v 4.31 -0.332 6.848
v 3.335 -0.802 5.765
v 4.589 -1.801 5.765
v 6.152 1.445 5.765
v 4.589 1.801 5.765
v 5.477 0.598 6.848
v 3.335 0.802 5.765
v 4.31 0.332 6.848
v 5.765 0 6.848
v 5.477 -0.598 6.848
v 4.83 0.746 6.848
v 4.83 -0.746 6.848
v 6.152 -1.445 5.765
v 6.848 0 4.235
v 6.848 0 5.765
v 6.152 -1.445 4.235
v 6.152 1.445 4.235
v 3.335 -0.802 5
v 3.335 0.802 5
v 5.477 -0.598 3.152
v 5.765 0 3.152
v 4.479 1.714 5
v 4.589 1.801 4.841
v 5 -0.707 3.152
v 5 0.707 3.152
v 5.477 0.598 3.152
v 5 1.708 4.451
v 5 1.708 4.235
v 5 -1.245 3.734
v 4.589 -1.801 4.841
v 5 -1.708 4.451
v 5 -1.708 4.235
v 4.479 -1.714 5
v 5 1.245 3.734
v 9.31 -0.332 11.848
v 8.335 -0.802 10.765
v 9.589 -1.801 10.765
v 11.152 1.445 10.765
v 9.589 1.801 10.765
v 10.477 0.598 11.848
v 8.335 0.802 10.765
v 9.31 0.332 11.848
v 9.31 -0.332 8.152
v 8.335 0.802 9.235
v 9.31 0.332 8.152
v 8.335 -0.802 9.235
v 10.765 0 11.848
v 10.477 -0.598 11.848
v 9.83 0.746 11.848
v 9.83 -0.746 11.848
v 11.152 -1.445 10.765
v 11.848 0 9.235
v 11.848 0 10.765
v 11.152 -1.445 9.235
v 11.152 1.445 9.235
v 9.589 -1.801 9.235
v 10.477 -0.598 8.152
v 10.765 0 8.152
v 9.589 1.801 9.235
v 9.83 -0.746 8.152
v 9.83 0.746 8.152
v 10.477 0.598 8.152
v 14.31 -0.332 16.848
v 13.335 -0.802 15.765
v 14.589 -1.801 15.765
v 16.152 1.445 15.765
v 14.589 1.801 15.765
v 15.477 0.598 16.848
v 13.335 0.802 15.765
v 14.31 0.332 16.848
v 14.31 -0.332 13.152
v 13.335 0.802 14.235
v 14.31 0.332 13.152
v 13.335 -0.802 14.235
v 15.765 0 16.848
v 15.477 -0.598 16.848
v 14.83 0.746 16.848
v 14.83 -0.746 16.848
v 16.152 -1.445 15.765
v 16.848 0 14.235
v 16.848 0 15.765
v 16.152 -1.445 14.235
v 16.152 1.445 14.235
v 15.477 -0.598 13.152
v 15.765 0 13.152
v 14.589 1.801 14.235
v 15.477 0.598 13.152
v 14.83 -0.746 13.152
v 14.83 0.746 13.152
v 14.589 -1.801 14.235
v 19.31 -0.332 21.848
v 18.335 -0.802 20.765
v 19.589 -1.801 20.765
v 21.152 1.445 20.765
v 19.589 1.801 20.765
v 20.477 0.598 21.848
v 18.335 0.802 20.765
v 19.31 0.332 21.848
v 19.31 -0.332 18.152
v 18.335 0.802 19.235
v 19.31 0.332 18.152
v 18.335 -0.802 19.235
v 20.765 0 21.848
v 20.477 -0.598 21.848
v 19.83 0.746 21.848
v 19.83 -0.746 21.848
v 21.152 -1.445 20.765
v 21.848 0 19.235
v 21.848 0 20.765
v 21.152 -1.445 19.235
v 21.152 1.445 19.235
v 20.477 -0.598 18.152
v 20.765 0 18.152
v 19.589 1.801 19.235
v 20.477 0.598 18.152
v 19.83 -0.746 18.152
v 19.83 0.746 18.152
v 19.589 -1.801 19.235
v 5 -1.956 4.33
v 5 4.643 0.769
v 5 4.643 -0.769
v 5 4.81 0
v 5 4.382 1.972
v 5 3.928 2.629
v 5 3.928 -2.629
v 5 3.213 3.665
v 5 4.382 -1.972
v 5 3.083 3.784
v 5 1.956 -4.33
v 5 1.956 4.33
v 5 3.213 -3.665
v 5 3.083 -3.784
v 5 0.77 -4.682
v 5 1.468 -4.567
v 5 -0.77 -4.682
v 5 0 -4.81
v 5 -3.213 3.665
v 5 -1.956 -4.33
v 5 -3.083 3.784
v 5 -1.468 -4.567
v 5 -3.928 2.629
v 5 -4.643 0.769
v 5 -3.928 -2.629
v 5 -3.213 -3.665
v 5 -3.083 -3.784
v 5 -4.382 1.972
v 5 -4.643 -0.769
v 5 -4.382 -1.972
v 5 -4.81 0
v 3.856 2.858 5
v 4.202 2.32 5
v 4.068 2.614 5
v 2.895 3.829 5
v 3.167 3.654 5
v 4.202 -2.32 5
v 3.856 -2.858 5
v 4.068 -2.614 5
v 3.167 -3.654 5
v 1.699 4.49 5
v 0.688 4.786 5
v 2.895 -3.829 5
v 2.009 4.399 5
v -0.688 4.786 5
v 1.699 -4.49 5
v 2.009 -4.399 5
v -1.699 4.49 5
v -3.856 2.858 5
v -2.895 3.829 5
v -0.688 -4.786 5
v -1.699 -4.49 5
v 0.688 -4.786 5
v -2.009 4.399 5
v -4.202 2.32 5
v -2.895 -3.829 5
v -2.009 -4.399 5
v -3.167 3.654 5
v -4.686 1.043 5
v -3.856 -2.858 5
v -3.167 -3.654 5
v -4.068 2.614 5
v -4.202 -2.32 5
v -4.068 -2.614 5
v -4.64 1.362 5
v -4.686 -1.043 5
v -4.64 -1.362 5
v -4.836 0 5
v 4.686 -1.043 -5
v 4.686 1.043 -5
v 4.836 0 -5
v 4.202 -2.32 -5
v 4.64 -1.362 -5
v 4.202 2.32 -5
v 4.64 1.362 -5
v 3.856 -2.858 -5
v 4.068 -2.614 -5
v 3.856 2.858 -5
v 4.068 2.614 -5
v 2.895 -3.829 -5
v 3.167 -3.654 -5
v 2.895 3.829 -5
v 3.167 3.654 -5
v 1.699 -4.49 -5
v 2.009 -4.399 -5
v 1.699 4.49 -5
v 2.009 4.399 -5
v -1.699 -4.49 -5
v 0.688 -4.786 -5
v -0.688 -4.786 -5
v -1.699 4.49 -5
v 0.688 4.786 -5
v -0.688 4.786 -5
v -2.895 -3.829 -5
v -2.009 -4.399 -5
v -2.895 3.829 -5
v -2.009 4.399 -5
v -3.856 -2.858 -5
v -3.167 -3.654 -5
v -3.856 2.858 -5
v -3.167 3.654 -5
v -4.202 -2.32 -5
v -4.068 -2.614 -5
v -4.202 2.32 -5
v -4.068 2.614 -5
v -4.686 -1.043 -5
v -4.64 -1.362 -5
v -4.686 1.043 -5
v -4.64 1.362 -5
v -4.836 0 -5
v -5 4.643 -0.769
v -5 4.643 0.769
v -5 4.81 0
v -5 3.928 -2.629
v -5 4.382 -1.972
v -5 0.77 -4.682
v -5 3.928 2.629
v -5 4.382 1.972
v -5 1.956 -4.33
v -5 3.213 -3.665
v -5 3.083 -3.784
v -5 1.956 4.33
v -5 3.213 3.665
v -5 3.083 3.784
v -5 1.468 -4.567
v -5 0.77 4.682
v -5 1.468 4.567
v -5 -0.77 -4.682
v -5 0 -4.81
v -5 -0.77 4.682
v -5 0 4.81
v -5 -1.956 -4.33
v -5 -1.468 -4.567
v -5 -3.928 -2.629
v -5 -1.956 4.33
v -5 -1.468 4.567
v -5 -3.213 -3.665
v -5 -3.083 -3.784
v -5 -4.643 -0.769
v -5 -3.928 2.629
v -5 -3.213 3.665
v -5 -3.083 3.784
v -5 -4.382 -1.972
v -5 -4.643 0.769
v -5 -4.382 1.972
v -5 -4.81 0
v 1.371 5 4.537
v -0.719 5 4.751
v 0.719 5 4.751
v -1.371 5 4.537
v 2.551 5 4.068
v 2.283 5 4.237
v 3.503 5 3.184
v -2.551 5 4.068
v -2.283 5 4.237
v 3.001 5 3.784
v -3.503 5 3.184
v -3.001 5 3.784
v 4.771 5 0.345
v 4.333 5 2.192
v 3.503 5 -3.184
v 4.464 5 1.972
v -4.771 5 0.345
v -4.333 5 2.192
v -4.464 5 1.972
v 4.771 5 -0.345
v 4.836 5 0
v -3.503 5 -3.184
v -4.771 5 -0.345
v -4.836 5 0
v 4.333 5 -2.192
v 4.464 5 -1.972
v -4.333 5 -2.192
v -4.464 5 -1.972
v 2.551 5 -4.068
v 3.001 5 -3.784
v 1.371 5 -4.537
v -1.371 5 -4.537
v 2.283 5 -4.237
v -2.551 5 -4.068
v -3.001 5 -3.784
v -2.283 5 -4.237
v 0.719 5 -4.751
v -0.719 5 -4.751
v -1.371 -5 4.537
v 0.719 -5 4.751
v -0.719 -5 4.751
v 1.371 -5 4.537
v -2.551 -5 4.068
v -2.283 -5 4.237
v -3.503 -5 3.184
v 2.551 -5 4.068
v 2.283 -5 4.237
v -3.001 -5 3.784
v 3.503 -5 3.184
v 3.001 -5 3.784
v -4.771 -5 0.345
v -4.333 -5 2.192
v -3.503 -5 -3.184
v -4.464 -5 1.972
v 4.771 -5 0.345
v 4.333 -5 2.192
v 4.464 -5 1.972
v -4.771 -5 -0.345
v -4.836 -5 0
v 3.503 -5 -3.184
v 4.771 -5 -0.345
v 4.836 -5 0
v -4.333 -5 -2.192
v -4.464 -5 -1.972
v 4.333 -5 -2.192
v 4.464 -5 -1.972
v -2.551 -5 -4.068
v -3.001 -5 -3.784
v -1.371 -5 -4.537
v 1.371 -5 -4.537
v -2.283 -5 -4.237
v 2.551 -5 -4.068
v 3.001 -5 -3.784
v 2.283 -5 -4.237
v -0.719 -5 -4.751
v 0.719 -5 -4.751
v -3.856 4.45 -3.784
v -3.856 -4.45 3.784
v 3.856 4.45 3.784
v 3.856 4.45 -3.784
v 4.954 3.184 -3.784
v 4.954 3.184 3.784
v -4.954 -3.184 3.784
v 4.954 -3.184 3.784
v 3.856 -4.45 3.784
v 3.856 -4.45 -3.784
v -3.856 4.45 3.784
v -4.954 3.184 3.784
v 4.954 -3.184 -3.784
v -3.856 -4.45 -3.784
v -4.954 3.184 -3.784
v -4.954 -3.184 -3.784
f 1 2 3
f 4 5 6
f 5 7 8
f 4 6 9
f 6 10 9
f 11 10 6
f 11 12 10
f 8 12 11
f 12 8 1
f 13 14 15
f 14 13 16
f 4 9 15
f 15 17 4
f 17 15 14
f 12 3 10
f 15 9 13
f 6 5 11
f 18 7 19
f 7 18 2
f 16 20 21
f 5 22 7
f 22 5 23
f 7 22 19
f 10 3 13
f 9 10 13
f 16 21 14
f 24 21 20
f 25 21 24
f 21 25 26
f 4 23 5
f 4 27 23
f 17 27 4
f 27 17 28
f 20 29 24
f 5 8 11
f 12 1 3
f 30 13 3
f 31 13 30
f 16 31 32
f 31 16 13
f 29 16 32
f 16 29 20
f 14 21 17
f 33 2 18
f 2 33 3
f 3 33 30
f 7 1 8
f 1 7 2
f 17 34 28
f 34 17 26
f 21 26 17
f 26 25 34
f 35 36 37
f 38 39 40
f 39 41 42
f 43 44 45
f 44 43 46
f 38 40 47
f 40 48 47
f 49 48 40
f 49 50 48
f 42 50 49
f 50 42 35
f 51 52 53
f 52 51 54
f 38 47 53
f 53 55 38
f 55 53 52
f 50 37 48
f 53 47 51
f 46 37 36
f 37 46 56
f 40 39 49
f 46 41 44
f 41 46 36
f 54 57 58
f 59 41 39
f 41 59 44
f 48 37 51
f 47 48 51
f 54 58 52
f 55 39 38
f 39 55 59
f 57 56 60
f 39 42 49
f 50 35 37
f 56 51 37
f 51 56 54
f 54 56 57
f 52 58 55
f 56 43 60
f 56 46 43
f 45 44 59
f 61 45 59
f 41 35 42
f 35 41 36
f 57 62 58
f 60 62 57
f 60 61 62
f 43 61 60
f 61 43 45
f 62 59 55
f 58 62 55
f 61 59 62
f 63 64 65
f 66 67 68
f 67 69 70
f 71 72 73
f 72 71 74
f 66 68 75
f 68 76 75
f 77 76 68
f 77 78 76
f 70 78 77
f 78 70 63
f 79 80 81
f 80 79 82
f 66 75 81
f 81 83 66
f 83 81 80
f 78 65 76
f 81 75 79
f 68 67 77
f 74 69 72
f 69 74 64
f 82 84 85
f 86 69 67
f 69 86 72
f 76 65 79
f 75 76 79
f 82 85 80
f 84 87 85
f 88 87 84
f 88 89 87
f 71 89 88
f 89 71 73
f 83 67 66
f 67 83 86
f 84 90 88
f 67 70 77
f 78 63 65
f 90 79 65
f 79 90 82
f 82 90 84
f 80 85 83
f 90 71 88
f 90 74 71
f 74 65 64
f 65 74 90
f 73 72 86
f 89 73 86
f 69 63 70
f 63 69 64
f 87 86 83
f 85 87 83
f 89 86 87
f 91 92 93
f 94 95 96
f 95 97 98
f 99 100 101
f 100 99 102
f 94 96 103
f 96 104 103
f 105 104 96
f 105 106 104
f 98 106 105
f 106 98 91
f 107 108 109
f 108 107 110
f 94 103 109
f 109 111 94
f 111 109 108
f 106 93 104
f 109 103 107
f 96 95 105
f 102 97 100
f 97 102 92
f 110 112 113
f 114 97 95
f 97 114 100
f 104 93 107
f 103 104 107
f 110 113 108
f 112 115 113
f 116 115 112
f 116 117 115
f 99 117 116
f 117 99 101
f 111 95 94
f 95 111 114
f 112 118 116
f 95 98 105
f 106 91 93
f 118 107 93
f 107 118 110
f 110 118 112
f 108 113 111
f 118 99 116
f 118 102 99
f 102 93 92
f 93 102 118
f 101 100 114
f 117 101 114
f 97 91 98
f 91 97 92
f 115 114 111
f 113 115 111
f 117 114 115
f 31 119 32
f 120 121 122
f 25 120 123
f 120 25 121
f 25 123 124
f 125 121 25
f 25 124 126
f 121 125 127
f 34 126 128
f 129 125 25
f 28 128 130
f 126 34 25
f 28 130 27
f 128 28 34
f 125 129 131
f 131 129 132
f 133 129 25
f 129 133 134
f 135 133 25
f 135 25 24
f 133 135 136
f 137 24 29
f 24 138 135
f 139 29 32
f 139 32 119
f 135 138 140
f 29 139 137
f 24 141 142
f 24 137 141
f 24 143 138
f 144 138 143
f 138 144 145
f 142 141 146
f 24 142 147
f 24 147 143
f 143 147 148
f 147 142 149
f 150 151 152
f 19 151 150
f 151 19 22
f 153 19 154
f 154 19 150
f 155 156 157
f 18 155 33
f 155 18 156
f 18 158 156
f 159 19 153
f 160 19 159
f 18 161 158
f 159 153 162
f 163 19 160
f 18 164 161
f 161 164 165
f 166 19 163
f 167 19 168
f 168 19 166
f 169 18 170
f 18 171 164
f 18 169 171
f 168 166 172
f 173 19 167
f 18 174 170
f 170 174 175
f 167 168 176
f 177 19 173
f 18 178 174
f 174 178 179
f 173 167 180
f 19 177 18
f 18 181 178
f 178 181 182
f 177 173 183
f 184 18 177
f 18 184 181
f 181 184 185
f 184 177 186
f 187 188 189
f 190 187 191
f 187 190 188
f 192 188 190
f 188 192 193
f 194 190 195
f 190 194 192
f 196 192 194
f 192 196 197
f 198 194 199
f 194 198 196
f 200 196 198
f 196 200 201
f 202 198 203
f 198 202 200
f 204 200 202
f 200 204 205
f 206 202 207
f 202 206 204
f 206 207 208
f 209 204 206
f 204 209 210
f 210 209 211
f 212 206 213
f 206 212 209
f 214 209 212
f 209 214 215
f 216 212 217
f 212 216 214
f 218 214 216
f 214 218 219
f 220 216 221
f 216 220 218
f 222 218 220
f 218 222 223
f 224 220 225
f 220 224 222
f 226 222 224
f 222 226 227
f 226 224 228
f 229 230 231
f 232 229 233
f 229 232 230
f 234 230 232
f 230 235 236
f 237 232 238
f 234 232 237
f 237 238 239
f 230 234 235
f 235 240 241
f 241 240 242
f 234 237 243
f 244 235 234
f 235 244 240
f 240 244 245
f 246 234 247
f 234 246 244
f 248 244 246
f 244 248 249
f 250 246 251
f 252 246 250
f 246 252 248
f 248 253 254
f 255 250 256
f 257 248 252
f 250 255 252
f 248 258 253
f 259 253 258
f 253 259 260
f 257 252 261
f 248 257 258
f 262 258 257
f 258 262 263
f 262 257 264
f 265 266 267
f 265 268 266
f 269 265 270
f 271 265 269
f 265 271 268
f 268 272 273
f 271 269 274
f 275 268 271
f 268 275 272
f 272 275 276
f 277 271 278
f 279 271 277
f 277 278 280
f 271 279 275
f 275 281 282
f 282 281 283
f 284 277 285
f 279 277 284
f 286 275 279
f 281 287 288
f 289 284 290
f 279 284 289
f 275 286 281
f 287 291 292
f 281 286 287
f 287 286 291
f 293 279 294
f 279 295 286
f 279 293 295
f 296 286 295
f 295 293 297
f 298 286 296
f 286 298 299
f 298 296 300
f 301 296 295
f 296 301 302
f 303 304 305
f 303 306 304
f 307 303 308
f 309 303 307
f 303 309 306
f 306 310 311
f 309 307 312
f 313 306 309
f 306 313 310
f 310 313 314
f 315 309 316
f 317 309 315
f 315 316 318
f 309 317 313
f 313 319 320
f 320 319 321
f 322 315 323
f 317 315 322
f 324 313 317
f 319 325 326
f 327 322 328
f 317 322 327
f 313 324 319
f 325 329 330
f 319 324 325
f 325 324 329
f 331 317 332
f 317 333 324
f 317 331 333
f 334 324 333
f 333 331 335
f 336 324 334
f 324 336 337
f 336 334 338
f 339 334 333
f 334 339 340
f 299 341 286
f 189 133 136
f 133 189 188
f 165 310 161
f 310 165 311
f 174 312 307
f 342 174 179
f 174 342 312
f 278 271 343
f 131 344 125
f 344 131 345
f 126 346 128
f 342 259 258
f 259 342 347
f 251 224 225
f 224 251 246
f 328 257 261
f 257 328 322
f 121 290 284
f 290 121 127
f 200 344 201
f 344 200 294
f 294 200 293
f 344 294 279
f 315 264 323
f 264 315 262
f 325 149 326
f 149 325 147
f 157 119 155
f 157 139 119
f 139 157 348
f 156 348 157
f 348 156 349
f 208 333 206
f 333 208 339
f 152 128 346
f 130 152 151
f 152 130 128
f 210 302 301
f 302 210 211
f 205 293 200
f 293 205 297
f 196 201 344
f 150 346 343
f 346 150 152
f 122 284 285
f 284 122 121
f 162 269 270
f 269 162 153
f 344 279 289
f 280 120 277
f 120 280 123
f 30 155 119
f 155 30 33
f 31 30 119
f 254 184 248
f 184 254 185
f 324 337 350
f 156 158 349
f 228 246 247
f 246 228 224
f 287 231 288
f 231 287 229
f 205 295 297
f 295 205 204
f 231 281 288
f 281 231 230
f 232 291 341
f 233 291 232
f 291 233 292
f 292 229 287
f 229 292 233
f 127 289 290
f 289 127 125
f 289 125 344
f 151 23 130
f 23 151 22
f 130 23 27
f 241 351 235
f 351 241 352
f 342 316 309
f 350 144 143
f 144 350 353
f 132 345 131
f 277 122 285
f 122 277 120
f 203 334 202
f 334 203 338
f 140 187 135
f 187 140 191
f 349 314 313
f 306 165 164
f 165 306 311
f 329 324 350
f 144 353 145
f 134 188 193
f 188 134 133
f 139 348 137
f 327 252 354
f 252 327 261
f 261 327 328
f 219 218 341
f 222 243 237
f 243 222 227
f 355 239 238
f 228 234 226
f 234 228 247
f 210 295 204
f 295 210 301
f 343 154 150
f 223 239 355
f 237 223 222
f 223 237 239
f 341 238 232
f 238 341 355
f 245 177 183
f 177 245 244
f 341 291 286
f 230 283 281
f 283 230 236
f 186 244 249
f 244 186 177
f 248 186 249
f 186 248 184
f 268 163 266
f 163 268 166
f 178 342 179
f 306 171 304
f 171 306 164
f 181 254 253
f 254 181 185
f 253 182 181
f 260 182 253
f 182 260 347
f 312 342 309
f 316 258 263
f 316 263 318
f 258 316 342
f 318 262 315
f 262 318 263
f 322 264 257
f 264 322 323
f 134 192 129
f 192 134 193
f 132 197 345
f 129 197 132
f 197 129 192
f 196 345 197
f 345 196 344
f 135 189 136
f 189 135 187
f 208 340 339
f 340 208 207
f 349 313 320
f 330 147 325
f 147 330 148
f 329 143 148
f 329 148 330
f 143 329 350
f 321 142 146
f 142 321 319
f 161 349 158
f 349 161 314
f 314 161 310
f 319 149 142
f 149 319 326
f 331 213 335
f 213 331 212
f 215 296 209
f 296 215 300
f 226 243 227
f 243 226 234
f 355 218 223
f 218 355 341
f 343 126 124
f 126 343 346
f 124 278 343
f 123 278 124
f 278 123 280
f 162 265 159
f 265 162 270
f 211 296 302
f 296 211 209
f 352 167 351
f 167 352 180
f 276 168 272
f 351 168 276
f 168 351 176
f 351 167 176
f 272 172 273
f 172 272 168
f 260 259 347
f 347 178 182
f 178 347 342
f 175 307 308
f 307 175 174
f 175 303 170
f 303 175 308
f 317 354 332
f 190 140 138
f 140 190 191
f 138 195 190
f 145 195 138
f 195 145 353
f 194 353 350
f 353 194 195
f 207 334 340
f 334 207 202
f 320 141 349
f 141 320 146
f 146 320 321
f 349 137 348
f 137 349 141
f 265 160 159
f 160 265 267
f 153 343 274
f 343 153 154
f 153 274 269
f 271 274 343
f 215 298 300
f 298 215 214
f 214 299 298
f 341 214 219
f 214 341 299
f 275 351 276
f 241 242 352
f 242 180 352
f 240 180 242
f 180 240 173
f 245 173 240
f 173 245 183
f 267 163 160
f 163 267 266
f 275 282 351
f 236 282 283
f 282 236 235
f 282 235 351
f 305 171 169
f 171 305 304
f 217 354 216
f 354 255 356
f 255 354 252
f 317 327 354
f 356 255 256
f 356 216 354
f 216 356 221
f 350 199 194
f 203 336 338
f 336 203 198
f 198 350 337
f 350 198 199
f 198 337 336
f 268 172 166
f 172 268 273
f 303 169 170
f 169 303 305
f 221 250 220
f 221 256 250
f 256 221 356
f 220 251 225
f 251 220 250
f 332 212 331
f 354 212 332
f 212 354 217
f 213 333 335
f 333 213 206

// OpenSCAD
// Complex OpenSCAD model
x = 20;

module my_part(size, color) {
    // This part is mocked for now in the compiler but the logic remains
    translate([size, 0, 0]) cube(size);
}

// Simple loop
for (i = [0:5:20]) {
    translate([i, 0, i]) sphere(r=2);
}

// Intersection test
intersection() {
    cube(size=10, center=true);
    sphere(r=7);
}
